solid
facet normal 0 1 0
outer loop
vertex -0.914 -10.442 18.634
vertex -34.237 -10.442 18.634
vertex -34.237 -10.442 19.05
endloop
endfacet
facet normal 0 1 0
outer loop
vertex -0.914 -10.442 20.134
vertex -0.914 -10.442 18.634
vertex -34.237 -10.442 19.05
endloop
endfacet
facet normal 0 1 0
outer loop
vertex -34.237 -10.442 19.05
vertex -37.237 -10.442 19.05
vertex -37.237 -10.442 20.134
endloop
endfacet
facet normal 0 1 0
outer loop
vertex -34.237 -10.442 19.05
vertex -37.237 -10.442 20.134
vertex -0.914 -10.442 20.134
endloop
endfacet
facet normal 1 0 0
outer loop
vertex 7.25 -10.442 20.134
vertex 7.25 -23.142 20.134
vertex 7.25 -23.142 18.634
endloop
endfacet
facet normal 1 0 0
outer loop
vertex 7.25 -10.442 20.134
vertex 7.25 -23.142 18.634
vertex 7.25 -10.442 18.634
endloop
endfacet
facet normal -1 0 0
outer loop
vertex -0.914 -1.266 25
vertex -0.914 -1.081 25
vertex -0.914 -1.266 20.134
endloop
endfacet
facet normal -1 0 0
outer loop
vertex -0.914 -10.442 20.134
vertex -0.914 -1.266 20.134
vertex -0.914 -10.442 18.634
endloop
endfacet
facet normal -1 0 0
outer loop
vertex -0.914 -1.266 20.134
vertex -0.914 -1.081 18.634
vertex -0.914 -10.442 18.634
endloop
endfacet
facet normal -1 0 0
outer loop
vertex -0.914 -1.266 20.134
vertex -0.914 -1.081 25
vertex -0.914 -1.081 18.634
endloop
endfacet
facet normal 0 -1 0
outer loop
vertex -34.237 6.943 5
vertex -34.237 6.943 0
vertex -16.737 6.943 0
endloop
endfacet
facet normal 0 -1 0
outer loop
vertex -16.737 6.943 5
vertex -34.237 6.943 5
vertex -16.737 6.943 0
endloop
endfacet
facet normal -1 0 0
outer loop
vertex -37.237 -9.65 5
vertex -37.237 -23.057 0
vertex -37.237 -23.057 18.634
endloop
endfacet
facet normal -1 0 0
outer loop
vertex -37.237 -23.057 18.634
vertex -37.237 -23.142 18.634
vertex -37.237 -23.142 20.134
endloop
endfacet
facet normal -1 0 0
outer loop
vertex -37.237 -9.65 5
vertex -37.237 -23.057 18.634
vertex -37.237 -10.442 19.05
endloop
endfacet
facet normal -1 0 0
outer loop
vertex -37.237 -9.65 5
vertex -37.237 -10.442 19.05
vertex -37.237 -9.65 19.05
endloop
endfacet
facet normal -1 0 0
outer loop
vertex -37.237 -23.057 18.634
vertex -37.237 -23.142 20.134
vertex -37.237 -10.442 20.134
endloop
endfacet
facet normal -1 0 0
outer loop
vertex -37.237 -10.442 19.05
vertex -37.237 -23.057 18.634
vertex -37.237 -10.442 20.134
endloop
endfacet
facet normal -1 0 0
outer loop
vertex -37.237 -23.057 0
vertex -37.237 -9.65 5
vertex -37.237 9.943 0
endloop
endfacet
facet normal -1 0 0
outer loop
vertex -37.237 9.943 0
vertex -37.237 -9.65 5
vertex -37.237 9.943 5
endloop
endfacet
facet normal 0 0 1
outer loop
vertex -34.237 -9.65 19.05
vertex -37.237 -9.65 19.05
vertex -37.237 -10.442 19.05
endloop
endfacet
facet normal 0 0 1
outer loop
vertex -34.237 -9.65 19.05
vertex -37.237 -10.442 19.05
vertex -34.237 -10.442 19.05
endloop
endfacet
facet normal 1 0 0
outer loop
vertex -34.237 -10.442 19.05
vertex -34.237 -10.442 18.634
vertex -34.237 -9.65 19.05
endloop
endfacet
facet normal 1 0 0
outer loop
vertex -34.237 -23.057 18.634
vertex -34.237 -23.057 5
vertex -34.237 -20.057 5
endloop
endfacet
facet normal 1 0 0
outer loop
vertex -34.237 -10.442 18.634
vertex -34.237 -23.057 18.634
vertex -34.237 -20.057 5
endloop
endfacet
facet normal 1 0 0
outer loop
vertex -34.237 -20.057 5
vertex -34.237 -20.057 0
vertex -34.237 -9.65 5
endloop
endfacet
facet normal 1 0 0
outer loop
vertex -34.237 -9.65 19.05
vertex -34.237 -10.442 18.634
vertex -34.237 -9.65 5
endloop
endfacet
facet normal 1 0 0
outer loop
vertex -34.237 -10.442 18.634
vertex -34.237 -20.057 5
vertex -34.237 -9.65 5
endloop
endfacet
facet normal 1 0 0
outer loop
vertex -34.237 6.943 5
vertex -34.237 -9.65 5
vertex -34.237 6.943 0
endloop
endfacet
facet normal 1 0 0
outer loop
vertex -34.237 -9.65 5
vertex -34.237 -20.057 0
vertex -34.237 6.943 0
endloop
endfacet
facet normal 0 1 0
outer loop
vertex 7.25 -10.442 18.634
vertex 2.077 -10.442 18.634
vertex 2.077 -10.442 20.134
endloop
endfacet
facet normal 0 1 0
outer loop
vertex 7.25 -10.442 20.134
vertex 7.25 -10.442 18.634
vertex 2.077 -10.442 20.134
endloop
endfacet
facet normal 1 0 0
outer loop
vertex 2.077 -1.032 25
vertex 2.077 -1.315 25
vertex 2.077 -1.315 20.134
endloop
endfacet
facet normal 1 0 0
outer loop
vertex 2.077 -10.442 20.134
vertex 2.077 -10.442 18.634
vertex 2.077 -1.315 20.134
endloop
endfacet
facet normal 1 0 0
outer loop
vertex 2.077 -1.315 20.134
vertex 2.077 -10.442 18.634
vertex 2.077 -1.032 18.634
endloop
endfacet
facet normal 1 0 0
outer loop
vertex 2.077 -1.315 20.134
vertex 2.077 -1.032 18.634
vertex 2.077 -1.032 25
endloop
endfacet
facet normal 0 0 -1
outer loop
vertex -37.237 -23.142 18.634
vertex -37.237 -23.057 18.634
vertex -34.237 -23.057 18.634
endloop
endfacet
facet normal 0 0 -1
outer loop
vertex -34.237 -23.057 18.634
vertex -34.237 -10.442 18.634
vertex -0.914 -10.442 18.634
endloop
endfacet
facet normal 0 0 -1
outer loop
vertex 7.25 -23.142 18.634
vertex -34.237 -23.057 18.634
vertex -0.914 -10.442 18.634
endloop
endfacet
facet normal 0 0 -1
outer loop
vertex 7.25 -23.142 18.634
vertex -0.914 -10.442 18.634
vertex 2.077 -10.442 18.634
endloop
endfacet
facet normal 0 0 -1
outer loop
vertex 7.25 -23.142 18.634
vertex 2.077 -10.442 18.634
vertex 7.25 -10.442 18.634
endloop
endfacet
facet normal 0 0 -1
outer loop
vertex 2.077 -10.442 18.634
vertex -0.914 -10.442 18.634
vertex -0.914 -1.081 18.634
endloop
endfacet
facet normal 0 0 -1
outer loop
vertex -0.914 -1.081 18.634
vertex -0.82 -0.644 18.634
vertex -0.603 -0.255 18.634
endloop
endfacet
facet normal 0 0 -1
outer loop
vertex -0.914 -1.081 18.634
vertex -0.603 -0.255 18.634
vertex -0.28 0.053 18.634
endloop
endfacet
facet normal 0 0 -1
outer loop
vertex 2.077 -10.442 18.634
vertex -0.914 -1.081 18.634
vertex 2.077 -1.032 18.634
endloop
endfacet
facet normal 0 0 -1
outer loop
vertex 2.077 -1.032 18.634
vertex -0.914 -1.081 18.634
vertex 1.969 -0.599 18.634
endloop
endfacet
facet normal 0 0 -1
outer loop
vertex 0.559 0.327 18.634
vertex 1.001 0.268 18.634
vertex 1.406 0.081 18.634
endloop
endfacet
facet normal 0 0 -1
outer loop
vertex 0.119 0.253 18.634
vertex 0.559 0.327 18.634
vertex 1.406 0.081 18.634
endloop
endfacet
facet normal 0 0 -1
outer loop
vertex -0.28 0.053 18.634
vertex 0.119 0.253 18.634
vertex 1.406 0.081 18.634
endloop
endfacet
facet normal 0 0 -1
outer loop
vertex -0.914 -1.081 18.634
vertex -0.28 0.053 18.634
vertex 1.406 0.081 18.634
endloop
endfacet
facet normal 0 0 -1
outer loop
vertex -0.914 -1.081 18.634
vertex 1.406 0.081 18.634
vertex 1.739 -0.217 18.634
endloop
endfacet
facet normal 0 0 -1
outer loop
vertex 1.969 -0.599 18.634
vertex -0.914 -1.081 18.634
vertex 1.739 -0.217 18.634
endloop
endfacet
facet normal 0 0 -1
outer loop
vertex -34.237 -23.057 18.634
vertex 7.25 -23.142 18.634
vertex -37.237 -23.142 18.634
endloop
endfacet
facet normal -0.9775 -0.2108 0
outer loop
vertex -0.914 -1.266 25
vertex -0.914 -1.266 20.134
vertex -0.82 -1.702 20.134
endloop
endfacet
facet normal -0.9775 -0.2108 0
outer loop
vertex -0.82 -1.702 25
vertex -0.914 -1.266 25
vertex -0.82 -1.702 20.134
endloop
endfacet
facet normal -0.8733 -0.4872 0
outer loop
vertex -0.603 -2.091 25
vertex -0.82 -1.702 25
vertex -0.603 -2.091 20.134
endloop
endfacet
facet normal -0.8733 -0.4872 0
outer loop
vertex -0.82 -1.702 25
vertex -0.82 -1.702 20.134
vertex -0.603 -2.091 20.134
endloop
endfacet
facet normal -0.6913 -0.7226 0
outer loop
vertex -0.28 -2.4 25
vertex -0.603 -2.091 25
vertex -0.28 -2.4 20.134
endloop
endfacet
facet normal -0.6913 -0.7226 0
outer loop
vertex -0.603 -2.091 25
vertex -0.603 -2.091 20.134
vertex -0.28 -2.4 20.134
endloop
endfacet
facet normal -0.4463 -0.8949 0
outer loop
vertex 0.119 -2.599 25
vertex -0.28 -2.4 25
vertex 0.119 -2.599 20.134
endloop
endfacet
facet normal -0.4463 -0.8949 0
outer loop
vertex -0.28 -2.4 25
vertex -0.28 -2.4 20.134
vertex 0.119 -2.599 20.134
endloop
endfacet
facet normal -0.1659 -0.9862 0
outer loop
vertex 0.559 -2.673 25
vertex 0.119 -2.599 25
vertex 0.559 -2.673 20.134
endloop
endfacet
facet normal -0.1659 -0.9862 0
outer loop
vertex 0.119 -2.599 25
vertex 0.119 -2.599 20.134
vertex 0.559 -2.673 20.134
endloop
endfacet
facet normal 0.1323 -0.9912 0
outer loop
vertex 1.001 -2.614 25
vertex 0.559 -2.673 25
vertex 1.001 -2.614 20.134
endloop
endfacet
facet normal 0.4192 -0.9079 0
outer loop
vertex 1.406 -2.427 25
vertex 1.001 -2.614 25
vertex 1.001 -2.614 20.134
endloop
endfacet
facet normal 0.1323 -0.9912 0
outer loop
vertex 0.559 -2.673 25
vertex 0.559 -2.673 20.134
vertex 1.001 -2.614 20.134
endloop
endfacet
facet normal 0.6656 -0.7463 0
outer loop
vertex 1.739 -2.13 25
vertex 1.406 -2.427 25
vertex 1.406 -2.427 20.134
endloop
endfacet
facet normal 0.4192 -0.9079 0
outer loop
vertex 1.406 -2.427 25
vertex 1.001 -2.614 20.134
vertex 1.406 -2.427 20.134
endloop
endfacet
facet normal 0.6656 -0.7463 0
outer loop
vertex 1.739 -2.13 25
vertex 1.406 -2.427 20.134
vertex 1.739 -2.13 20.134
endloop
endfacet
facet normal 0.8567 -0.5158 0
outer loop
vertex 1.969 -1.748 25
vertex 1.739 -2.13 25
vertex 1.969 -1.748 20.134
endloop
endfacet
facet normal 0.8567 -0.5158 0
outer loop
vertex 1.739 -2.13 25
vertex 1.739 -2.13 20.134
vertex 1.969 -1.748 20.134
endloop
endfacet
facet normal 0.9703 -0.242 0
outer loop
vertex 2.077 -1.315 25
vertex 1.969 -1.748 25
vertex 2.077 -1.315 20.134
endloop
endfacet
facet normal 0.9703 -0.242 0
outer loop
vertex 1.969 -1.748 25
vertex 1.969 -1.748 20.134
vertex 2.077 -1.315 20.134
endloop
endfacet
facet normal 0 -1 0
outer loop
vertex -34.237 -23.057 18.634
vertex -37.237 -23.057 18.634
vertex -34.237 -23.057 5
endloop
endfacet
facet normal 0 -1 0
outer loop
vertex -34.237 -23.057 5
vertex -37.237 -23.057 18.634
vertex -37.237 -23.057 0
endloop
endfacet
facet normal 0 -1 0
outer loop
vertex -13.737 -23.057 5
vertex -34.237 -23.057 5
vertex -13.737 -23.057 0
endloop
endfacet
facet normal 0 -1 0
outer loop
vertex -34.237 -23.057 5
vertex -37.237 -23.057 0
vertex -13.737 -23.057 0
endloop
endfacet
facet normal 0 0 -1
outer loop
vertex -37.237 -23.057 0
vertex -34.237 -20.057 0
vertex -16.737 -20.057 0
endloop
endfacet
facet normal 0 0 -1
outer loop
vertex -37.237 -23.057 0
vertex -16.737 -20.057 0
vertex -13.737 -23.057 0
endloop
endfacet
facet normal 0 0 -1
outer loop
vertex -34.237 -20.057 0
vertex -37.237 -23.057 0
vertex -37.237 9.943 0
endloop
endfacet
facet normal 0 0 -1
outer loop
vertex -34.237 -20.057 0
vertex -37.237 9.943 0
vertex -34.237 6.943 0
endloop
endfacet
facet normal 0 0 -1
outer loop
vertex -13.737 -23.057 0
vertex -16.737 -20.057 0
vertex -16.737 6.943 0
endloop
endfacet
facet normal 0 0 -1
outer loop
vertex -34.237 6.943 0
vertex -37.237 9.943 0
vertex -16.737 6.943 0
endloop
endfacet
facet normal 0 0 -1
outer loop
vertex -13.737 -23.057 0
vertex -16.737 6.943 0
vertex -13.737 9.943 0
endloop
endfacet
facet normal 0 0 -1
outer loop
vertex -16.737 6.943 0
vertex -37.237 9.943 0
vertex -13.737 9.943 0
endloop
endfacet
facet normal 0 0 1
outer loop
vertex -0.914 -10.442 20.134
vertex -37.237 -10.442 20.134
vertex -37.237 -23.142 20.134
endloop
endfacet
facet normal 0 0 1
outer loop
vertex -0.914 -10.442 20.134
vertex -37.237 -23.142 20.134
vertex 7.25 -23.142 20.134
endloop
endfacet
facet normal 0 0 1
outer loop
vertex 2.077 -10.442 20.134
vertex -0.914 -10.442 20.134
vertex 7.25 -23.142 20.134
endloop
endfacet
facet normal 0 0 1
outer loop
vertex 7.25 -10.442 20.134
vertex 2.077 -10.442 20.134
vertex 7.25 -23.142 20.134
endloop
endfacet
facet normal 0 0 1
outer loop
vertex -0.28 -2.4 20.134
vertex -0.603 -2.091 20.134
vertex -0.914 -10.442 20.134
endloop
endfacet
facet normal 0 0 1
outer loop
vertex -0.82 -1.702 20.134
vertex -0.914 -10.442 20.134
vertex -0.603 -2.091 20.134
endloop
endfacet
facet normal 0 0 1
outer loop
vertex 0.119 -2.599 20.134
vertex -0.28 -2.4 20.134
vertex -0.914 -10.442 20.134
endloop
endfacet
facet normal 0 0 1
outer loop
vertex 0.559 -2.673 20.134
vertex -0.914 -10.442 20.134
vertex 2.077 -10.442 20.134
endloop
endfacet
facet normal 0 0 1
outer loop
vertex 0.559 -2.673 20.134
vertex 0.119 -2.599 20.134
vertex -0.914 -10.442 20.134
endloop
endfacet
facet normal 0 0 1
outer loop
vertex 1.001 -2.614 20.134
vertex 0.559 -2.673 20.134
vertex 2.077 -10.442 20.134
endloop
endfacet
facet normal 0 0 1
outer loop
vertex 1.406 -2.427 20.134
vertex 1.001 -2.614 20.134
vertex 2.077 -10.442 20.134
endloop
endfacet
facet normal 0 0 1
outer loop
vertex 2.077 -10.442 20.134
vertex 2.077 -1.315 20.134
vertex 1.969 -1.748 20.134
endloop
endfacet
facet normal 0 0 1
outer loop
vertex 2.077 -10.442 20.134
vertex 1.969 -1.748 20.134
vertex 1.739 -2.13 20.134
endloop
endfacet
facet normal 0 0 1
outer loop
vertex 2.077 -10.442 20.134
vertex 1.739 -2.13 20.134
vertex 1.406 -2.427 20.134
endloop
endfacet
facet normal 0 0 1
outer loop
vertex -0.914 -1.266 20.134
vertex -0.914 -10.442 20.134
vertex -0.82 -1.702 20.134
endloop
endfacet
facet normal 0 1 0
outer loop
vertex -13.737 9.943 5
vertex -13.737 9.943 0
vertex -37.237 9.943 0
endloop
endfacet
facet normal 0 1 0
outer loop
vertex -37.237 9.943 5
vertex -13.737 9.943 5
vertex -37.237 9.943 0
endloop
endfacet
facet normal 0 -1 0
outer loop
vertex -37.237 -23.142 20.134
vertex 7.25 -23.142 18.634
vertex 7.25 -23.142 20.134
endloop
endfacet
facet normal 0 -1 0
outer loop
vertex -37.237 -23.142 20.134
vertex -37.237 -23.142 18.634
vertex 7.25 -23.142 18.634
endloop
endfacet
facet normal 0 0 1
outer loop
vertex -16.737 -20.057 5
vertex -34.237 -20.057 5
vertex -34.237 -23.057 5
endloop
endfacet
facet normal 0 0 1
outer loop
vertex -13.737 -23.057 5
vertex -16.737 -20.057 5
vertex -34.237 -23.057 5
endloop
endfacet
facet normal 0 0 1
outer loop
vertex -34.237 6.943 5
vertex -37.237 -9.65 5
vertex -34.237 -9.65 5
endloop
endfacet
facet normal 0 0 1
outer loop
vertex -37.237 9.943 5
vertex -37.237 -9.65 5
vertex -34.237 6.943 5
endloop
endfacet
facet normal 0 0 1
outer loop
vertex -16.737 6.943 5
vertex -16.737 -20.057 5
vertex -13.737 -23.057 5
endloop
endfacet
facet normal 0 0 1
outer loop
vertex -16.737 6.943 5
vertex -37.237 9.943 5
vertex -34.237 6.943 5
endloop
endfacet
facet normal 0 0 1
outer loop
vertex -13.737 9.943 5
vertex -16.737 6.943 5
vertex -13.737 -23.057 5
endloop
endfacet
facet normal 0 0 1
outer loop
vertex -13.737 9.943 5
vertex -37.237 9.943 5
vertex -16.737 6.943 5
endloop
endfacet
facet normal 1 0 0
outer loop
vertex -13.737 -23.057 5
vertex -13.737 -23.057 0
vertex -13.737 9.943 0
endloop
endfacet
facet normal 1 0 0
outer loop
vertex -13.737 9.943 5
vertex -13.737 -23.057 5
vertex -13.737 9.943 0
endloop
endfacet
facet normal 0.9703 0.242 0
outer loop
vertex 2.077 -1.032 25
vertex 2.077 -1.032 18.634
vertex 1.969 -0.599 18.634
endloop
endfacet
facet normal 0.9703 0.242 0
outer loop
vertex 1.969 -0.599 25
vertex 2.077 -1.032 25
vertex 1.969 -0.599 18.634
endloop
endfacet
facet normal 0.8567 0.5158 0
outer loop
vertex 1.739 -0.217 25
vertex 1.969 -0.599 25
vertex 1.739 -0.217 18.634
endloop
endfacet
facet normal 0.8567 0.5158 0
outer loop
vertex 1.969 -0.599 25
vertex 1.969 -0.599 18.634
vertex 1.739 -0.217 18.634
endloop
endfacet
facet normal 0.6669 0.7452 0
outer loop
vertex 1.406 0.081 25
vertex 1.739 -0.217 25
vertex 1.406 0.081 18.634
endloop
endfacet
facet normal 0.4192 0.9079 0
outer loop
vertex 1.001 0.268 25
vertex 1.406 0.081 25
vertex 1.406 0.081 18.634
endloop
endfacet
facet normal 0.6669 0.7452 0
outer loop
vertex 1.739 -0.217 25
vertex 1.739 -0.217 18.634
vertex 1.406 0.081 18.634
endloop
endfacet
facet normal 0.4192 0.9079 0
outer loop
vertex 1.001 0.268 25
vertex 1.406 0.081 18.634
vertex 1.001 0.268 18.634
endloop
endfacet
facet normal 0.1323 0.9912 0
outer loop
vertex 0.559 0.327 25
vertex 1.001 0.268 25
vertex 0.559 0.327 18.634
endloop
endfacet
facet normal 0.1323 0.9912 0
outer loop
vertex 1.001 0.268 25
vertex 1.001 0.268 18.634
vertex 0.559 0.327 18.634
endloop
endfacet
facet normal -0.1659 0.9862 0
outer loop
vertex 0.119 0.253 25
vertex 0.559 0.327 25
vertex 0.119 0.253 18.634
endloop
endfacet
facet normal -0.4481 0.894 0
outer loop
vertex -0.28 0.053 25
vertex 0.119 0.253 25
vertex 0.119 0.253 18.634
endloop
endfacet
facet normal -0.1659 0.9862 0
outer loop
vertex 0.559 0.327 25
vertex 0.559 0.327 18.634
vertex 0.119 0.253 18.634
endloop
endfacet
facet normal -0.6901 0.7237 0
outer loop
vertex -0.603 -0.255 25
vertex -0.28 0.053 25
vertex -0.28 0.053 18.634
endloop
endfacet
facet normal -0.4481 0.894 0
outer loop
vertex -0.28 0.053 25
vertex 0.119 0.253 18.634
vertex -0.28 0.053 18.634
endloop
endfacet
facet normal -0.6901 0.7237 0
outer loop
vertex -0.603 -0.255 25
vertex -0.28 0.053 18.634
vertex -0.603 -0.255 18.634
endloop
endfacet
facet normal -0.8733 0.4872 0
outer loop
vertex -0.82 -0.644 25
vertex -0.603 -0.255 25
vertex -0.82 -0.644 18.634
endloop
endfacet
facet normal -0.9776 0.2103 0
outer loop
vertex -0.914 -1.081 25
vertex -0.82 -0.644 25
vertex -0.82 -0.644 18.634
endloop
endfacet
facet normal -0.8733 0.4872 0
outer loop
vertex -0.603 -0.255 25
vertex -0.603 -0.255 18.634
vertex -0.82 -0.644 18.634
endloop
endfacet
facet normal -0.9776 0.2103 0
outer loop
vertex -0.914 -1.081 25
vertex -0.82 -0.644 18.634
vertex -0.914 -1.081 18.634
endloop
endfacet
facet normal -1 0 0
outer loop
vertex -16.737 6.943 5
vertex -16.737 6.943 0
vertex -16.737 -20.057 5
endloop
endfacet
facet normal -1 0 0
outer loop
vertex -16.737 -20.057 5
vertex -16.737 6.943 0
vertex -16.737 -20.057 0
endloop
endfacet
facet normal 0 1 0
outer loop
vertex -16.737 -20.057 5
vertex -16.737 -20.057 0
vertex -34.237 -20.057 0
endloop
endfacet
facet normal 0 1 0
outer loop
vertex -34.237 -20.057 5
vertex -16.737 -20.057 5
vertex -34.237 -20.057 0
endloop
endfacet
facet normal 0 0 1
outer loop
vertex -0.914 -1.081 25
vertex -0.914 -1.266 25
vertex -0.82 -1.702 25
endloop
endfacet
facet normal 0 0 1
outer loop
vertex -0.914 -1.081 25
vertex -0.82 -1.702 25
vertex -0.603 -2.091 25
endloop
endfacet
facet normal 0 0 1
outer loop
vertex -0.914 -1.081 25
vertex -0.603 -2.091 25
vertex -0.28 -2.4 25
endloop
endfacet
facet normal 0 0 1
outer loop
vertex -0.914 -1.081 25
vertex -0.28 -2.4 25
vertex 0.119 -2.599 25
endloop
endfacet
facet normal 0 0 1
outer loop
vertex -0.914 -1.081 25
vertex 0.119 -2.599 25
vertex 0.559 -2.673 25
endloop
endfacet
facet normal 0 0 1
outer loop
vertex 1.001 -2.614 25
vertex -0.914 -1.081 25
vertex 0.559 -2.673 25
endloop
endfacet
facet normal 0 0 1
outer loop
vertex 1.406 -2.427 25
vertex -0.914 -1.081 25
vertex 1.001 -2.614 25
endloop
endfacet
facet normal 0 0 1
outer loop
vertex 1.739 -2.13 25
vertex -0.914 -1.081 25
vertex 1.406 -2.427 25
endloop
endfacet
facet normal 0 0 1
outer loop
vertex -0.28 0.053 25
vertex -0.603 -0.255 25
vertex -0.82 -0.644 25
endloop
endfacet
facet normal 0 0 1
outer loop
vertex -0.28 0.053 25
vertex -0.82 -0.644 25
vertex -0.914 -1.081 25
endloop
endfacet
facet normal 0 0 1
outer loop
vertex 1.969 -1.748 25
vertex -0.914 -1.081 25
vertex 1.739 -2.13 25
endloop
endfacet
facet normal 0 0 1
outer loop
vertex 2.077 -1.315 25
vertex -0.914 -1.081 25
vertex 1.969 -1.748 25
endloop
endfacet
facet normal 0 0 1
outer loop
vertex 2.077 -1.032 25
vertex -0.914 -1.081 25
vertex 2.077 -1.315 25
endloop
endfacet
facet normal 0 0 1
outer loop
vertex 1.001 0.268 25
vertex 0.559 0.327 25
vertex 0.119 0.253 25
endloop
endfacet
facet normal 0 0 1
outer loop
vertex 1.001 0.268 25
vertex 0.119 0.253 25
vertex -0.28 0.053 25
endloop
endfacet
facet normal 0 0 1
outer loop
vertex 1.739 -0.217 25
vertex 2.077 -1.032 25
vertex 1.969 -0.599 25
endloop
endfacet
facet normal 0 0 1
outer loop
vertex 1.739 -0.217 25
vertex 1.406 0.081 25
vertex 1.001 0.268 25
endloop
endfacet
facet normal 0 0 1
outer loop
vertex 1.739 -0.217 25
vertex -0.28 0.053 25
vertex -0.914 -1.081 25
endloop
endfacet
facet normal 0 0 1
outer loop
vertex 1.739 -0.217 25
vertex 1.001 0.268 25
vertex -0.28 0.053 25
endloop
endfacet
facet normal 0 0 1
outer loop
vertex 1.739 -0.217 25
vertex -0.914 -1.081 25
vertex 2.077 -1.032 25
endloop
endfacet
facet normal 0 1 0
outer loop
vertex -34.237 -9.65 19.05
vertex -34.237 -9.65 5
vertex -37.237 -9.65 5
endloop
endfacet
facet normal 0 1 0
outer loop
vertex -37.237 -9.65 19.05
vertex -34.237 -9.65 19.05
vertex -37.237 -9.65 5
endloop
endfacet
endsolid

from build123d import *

# Parameters (mm, degrees)
F1_DEPTH      = 5
F2_DEPTH      = 19.05
F3_DEPTH      = 5
F4_W          = 12.7
F4_H          = 1.5
F5_DEPTH      = 37.23736246
F5_DEPTH_BACK = 7.25
F6_START      = 18.6339281499
F6_DEPTH      = 1.5
F7_START      = 18.6339281499
F7_DEPTH      = 6.3660718501


with BuildPart() as f1:
    # F0 (on Top) → F1 (new body)
    with BuildSketch(Plane.XY):
        Polygon((-34.23736246, 9.9433793599), (-34.23736246, 6.9433793599), (-16.73736246, 6.9433793599), (-16.73736246, -20.0566206401), (-34.23736246, -20.0566206401), (-34.23736246, -23.0566206401), (-13.73736246, -23.0566206401), (-13.73736246, 9.9433793599), align=None)
    extrude(amount=F1_DEPTH)

    # F0 (on Top) → F2 (join)
    with BuildSketch(Plane.XY):
        Polygon((-34.23736246, -20.0566206401), (-34.23736246, -9.6503041635), (-37.23736246, -9.6503041635), (-37.23736246, -23.0566206401), (-34.23736246, -23.0566206401), align=None)
    extrude(amount=F2_DEPTH)

    # F0 (on Top) → F3 (join)
    with BuildSketch(Plane.XY):
        Polygon((-34.23736246, -9.6503041635), (-34.23736246, 6.9433793599), (-34.23736246, 9.9433793599), (-37.23736246, 9.9433793599), (-37.23736246, -9.6503041635), align=None)
    extrude(amount=F3_DEPTH)

    # F4 (on Right) → F5 (join, two sides)
    with BuildSketch(Plane.YZ) as f5_sk:
        with Locations((-16.7916113675, 19.3839281499)):
            Rectangle(F4_W, F4_H)
    extrude(amount=-F5_DEPTH)
    extrude(f5_sk.sketch, amount=F5_DEPTH_BACK)

    # F0 (on Top) → F6 (join)
    with BuildSketch(Plane.XY.offset(F6_START)):
        with BuildLine():
            Line((2.0767554697, -8.3933884358), (2.0767554697, -1.3145332665))
            ThreePointArc((2.0767554697, -1.3145332665), (0.5588870059, -2.6728853277), (-0.9137062697, -1.2655779555))
            Line((-0.9137062697, -1.2655779555), (-0.9137062697, -8.3933884358))
            Line((-0.9137062697, -8.3933884358), (-0.9137062697, -23.0566206401))
            Line((-0.9137062697, -23.0566206401), (2.0767554697, -23.0566206401))
            Line((2.0767554697, -23.0566206401), (2.0767554697, -8.3933884358))
        make_face()
    extrude(amount=F6_DEPTH)

    # F0 (on Top) → F7 (join)
    with BuildSketch(Plane.XY.offset(F7_START)):
        with BuildLine():
            Line((2.0767554697, -1.3145332665), (2.0767554697, -1.0316392973))
            ThreePointArc((2.0767554697, -1.0316392973), (0.5588870059, 0.3267127639), (-0.9137062697, -1.0805946084))
            Line((-0.9137062697, -1.0805946084), (-0.9137062697, -1.2655779555))
            ThreePointArc((-0.9137062697, -1.2655779555), (0.5588870059, -2.6728853277), (2.0767554697, -1.3145332665))
        make_face()
    extrude(amount=F7_DEPTH)


solid = f1.part
